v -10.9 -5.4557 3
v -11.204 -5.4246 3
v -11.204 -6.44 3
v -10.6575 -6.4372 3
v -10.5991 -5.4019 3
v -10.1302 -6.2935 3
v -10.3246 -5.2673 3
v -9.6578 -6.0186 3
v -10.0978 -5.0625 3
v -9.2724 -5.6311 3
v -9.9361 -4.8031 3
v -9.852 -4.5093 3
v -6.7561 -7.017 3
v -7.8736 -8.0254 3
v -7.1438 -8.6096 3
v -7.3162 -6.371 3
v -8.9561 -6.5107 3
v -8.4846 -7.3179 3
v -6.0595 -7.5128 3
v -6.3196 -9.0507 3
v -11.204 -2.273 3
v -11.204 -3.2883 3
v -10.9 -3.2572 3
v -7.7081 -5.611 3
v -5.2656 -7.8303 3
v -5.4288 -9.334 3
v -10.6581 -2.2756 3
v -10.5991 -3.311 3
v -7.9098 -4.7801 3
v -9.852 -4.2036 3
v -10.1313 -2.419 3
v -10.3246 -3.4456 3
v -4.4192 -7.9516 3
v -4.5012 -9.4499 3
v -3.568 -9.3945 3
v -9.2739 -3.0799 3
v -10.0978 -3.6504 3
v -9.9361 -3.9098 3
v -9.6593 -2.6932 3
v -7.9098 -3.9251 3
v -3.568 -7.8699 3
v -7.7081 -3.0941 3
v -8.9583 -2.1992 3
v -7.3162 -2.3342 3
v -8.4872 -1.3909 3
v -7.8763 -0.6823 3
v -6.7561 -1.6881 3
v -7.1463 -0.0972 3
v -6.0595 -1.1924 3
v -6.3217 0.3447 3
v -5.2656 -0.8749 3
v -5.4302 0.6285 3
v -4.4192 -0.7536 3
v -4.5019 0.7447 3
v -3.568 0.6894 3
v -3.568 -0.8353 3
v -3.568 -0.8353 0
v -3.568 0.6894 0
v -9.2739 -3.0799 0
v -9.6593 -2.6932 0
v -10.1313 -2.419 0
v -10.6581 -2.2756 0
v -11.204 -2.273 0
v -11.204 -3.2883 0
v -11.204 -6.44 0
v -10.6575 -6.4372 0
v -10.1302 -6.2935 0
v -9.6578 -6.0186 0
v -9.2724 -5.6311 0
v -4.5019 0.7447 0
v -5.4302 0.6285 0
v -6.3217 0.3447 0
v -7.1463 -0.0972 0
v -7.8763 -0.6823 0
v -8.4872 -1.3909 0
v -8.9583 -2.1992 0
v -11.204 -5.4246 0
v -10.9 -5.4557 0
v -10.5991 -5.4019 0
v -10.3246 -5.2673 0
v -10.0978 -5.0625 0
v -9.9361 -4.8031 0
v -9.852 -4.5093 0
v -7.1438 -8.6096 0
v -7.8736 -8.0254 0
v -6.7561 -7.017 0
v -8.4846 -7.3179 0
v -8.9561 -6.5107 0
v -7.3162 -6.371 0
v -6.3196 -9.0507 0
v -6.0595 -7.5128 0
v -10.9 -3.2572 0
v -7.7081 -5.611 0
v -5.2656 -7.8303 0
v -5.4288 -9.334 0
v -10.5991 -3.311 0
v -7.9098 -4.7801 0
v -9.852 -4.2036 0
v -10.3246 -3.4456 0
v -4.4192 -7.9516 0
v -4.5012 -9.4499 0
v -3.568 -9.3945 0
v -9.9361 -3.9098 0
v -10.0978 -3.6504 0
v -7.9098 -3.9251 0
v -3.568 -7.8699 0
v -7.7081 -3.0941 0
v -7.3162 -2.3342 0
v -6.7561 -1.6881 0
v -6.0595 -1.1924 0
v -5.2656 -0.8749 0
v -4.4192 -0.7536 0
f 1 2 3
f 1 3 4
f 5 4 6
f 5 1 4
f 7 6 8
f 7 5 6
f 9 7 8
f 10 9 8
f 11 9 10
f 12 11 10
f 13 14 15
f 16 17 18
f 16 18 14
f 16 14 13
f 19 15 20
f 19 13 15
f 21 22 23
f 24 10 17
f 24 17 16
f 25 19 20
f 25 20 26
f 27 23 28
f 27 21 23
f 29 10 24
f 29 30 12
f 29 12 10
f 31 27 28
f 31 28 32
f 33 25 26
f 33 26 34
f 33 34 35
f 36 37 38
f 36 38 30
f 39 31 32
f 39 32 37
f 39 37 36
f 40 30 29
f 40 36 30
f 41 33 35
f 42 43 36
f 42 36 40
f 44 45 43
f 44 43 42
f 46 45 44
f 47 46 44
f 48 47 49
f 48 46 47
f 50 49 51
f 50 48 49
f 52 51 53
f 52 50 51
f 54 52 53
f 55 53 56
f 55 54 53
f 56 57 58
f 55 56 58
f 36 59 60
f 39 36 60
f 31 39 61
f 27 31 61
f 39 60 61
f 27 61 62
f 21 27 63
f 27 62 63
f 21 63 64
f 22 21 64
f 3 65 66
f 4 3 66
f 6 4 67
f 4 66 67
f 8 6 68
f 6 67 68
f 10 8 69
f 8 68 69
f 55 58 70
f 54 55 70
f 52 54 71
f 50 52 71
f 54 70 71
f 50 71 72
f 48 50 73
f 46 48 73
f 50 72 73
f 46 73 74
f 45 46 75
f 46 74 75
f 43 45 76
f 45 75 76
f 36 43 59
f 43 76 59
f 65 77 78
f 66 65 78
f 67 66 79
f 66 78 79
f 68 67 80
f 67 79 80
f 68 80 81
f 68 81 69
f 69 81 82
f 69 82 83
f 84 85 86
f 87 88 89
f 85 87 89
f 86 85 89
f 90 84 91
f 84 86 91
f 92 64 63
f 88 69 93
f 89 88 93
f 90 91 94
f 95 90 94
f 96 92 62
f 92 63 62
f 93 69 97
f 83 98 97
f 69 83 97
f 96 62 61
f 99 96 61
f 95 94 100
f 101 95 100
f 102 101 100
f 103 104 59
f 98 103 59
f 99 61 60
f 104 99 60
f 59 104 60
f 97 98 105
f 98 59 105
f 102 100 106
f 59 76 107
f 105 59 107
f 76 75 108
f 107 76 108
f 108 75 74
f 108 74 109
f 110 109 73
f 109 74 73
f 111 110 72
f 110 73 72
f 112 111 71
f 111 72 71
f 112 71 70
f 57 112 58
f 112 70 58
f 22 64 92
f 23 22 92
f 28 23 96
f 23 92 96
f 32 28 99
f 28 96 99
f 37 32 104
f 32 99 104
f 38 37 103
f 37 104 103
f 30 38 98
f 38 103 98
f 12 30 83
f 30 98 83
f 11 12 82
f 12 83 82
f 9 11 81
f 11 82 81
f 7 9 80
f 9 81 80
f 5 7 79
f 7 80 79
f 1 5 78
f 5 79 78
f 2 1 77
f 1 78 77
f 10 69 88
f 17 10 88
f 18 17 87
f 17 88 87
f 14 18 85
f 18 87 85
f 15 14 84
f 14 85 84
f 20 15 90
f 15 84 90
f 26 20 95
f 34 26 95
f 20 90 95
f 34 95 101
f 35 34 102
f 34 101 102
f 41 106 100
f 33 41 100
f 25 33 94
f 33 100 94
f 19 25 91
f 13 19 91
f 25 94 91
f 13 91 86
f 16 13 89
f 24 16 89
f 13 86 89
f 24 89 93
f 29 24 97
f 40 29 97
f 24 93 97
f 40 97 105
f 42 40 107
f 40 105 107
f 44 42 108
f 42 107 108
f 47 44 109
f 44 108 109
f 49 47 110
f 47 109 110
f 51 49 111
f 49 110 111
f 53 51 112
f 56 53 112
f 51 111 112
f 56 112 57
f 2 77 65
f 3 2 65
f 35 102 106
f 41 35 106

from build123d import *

# Parameters (mm, degrees)
F1_DEPTH = 3


with BuildPart() as f1:
    # F0 (on Top) → F1 (new body)
    with BuildSketch(Plane.XY):
        with BuildLine():
            ThreePointArc((-3.568038, -7.869875), (-7.935237, -4.352574), (-3.568038, -0.835273))
            Line((-3.568038, -0.835273), (-3.568038, 0.689391))
            ThreePointArc((-3.568038, 0.689391), (-7.146301, -0.097234), (-9.273883, -3.079873))
            ThreePointArc((-9.273883, -3.079873), (-10.131319, -2.418957), (-11.20402, -2.272952))
            Line((-11.20402, -2.272952), (-11.20402, -3.288286))
            ThreePointArc((-11.20402, -3.288286), (-9.841317, -4.356456), (-11.20402, -5.424626))
            Line((-11.20402, -5.424626), (-11.20402, -6.439959))
            ThreePointArc((-11.20402, -6.439959), (-10.13018, -6.293478), (-9.272384, -5.631078))
            ThreePointArc((-9.272384, -5.631078), (-7.1438, -8.609565), (-3.568038, -9.394538))
            Line((-3.568038, -9.394538), (-3.568038, -7.869875))
        make_face()
    extrude(amount=F1_DEPTH)


solid = f1.part
